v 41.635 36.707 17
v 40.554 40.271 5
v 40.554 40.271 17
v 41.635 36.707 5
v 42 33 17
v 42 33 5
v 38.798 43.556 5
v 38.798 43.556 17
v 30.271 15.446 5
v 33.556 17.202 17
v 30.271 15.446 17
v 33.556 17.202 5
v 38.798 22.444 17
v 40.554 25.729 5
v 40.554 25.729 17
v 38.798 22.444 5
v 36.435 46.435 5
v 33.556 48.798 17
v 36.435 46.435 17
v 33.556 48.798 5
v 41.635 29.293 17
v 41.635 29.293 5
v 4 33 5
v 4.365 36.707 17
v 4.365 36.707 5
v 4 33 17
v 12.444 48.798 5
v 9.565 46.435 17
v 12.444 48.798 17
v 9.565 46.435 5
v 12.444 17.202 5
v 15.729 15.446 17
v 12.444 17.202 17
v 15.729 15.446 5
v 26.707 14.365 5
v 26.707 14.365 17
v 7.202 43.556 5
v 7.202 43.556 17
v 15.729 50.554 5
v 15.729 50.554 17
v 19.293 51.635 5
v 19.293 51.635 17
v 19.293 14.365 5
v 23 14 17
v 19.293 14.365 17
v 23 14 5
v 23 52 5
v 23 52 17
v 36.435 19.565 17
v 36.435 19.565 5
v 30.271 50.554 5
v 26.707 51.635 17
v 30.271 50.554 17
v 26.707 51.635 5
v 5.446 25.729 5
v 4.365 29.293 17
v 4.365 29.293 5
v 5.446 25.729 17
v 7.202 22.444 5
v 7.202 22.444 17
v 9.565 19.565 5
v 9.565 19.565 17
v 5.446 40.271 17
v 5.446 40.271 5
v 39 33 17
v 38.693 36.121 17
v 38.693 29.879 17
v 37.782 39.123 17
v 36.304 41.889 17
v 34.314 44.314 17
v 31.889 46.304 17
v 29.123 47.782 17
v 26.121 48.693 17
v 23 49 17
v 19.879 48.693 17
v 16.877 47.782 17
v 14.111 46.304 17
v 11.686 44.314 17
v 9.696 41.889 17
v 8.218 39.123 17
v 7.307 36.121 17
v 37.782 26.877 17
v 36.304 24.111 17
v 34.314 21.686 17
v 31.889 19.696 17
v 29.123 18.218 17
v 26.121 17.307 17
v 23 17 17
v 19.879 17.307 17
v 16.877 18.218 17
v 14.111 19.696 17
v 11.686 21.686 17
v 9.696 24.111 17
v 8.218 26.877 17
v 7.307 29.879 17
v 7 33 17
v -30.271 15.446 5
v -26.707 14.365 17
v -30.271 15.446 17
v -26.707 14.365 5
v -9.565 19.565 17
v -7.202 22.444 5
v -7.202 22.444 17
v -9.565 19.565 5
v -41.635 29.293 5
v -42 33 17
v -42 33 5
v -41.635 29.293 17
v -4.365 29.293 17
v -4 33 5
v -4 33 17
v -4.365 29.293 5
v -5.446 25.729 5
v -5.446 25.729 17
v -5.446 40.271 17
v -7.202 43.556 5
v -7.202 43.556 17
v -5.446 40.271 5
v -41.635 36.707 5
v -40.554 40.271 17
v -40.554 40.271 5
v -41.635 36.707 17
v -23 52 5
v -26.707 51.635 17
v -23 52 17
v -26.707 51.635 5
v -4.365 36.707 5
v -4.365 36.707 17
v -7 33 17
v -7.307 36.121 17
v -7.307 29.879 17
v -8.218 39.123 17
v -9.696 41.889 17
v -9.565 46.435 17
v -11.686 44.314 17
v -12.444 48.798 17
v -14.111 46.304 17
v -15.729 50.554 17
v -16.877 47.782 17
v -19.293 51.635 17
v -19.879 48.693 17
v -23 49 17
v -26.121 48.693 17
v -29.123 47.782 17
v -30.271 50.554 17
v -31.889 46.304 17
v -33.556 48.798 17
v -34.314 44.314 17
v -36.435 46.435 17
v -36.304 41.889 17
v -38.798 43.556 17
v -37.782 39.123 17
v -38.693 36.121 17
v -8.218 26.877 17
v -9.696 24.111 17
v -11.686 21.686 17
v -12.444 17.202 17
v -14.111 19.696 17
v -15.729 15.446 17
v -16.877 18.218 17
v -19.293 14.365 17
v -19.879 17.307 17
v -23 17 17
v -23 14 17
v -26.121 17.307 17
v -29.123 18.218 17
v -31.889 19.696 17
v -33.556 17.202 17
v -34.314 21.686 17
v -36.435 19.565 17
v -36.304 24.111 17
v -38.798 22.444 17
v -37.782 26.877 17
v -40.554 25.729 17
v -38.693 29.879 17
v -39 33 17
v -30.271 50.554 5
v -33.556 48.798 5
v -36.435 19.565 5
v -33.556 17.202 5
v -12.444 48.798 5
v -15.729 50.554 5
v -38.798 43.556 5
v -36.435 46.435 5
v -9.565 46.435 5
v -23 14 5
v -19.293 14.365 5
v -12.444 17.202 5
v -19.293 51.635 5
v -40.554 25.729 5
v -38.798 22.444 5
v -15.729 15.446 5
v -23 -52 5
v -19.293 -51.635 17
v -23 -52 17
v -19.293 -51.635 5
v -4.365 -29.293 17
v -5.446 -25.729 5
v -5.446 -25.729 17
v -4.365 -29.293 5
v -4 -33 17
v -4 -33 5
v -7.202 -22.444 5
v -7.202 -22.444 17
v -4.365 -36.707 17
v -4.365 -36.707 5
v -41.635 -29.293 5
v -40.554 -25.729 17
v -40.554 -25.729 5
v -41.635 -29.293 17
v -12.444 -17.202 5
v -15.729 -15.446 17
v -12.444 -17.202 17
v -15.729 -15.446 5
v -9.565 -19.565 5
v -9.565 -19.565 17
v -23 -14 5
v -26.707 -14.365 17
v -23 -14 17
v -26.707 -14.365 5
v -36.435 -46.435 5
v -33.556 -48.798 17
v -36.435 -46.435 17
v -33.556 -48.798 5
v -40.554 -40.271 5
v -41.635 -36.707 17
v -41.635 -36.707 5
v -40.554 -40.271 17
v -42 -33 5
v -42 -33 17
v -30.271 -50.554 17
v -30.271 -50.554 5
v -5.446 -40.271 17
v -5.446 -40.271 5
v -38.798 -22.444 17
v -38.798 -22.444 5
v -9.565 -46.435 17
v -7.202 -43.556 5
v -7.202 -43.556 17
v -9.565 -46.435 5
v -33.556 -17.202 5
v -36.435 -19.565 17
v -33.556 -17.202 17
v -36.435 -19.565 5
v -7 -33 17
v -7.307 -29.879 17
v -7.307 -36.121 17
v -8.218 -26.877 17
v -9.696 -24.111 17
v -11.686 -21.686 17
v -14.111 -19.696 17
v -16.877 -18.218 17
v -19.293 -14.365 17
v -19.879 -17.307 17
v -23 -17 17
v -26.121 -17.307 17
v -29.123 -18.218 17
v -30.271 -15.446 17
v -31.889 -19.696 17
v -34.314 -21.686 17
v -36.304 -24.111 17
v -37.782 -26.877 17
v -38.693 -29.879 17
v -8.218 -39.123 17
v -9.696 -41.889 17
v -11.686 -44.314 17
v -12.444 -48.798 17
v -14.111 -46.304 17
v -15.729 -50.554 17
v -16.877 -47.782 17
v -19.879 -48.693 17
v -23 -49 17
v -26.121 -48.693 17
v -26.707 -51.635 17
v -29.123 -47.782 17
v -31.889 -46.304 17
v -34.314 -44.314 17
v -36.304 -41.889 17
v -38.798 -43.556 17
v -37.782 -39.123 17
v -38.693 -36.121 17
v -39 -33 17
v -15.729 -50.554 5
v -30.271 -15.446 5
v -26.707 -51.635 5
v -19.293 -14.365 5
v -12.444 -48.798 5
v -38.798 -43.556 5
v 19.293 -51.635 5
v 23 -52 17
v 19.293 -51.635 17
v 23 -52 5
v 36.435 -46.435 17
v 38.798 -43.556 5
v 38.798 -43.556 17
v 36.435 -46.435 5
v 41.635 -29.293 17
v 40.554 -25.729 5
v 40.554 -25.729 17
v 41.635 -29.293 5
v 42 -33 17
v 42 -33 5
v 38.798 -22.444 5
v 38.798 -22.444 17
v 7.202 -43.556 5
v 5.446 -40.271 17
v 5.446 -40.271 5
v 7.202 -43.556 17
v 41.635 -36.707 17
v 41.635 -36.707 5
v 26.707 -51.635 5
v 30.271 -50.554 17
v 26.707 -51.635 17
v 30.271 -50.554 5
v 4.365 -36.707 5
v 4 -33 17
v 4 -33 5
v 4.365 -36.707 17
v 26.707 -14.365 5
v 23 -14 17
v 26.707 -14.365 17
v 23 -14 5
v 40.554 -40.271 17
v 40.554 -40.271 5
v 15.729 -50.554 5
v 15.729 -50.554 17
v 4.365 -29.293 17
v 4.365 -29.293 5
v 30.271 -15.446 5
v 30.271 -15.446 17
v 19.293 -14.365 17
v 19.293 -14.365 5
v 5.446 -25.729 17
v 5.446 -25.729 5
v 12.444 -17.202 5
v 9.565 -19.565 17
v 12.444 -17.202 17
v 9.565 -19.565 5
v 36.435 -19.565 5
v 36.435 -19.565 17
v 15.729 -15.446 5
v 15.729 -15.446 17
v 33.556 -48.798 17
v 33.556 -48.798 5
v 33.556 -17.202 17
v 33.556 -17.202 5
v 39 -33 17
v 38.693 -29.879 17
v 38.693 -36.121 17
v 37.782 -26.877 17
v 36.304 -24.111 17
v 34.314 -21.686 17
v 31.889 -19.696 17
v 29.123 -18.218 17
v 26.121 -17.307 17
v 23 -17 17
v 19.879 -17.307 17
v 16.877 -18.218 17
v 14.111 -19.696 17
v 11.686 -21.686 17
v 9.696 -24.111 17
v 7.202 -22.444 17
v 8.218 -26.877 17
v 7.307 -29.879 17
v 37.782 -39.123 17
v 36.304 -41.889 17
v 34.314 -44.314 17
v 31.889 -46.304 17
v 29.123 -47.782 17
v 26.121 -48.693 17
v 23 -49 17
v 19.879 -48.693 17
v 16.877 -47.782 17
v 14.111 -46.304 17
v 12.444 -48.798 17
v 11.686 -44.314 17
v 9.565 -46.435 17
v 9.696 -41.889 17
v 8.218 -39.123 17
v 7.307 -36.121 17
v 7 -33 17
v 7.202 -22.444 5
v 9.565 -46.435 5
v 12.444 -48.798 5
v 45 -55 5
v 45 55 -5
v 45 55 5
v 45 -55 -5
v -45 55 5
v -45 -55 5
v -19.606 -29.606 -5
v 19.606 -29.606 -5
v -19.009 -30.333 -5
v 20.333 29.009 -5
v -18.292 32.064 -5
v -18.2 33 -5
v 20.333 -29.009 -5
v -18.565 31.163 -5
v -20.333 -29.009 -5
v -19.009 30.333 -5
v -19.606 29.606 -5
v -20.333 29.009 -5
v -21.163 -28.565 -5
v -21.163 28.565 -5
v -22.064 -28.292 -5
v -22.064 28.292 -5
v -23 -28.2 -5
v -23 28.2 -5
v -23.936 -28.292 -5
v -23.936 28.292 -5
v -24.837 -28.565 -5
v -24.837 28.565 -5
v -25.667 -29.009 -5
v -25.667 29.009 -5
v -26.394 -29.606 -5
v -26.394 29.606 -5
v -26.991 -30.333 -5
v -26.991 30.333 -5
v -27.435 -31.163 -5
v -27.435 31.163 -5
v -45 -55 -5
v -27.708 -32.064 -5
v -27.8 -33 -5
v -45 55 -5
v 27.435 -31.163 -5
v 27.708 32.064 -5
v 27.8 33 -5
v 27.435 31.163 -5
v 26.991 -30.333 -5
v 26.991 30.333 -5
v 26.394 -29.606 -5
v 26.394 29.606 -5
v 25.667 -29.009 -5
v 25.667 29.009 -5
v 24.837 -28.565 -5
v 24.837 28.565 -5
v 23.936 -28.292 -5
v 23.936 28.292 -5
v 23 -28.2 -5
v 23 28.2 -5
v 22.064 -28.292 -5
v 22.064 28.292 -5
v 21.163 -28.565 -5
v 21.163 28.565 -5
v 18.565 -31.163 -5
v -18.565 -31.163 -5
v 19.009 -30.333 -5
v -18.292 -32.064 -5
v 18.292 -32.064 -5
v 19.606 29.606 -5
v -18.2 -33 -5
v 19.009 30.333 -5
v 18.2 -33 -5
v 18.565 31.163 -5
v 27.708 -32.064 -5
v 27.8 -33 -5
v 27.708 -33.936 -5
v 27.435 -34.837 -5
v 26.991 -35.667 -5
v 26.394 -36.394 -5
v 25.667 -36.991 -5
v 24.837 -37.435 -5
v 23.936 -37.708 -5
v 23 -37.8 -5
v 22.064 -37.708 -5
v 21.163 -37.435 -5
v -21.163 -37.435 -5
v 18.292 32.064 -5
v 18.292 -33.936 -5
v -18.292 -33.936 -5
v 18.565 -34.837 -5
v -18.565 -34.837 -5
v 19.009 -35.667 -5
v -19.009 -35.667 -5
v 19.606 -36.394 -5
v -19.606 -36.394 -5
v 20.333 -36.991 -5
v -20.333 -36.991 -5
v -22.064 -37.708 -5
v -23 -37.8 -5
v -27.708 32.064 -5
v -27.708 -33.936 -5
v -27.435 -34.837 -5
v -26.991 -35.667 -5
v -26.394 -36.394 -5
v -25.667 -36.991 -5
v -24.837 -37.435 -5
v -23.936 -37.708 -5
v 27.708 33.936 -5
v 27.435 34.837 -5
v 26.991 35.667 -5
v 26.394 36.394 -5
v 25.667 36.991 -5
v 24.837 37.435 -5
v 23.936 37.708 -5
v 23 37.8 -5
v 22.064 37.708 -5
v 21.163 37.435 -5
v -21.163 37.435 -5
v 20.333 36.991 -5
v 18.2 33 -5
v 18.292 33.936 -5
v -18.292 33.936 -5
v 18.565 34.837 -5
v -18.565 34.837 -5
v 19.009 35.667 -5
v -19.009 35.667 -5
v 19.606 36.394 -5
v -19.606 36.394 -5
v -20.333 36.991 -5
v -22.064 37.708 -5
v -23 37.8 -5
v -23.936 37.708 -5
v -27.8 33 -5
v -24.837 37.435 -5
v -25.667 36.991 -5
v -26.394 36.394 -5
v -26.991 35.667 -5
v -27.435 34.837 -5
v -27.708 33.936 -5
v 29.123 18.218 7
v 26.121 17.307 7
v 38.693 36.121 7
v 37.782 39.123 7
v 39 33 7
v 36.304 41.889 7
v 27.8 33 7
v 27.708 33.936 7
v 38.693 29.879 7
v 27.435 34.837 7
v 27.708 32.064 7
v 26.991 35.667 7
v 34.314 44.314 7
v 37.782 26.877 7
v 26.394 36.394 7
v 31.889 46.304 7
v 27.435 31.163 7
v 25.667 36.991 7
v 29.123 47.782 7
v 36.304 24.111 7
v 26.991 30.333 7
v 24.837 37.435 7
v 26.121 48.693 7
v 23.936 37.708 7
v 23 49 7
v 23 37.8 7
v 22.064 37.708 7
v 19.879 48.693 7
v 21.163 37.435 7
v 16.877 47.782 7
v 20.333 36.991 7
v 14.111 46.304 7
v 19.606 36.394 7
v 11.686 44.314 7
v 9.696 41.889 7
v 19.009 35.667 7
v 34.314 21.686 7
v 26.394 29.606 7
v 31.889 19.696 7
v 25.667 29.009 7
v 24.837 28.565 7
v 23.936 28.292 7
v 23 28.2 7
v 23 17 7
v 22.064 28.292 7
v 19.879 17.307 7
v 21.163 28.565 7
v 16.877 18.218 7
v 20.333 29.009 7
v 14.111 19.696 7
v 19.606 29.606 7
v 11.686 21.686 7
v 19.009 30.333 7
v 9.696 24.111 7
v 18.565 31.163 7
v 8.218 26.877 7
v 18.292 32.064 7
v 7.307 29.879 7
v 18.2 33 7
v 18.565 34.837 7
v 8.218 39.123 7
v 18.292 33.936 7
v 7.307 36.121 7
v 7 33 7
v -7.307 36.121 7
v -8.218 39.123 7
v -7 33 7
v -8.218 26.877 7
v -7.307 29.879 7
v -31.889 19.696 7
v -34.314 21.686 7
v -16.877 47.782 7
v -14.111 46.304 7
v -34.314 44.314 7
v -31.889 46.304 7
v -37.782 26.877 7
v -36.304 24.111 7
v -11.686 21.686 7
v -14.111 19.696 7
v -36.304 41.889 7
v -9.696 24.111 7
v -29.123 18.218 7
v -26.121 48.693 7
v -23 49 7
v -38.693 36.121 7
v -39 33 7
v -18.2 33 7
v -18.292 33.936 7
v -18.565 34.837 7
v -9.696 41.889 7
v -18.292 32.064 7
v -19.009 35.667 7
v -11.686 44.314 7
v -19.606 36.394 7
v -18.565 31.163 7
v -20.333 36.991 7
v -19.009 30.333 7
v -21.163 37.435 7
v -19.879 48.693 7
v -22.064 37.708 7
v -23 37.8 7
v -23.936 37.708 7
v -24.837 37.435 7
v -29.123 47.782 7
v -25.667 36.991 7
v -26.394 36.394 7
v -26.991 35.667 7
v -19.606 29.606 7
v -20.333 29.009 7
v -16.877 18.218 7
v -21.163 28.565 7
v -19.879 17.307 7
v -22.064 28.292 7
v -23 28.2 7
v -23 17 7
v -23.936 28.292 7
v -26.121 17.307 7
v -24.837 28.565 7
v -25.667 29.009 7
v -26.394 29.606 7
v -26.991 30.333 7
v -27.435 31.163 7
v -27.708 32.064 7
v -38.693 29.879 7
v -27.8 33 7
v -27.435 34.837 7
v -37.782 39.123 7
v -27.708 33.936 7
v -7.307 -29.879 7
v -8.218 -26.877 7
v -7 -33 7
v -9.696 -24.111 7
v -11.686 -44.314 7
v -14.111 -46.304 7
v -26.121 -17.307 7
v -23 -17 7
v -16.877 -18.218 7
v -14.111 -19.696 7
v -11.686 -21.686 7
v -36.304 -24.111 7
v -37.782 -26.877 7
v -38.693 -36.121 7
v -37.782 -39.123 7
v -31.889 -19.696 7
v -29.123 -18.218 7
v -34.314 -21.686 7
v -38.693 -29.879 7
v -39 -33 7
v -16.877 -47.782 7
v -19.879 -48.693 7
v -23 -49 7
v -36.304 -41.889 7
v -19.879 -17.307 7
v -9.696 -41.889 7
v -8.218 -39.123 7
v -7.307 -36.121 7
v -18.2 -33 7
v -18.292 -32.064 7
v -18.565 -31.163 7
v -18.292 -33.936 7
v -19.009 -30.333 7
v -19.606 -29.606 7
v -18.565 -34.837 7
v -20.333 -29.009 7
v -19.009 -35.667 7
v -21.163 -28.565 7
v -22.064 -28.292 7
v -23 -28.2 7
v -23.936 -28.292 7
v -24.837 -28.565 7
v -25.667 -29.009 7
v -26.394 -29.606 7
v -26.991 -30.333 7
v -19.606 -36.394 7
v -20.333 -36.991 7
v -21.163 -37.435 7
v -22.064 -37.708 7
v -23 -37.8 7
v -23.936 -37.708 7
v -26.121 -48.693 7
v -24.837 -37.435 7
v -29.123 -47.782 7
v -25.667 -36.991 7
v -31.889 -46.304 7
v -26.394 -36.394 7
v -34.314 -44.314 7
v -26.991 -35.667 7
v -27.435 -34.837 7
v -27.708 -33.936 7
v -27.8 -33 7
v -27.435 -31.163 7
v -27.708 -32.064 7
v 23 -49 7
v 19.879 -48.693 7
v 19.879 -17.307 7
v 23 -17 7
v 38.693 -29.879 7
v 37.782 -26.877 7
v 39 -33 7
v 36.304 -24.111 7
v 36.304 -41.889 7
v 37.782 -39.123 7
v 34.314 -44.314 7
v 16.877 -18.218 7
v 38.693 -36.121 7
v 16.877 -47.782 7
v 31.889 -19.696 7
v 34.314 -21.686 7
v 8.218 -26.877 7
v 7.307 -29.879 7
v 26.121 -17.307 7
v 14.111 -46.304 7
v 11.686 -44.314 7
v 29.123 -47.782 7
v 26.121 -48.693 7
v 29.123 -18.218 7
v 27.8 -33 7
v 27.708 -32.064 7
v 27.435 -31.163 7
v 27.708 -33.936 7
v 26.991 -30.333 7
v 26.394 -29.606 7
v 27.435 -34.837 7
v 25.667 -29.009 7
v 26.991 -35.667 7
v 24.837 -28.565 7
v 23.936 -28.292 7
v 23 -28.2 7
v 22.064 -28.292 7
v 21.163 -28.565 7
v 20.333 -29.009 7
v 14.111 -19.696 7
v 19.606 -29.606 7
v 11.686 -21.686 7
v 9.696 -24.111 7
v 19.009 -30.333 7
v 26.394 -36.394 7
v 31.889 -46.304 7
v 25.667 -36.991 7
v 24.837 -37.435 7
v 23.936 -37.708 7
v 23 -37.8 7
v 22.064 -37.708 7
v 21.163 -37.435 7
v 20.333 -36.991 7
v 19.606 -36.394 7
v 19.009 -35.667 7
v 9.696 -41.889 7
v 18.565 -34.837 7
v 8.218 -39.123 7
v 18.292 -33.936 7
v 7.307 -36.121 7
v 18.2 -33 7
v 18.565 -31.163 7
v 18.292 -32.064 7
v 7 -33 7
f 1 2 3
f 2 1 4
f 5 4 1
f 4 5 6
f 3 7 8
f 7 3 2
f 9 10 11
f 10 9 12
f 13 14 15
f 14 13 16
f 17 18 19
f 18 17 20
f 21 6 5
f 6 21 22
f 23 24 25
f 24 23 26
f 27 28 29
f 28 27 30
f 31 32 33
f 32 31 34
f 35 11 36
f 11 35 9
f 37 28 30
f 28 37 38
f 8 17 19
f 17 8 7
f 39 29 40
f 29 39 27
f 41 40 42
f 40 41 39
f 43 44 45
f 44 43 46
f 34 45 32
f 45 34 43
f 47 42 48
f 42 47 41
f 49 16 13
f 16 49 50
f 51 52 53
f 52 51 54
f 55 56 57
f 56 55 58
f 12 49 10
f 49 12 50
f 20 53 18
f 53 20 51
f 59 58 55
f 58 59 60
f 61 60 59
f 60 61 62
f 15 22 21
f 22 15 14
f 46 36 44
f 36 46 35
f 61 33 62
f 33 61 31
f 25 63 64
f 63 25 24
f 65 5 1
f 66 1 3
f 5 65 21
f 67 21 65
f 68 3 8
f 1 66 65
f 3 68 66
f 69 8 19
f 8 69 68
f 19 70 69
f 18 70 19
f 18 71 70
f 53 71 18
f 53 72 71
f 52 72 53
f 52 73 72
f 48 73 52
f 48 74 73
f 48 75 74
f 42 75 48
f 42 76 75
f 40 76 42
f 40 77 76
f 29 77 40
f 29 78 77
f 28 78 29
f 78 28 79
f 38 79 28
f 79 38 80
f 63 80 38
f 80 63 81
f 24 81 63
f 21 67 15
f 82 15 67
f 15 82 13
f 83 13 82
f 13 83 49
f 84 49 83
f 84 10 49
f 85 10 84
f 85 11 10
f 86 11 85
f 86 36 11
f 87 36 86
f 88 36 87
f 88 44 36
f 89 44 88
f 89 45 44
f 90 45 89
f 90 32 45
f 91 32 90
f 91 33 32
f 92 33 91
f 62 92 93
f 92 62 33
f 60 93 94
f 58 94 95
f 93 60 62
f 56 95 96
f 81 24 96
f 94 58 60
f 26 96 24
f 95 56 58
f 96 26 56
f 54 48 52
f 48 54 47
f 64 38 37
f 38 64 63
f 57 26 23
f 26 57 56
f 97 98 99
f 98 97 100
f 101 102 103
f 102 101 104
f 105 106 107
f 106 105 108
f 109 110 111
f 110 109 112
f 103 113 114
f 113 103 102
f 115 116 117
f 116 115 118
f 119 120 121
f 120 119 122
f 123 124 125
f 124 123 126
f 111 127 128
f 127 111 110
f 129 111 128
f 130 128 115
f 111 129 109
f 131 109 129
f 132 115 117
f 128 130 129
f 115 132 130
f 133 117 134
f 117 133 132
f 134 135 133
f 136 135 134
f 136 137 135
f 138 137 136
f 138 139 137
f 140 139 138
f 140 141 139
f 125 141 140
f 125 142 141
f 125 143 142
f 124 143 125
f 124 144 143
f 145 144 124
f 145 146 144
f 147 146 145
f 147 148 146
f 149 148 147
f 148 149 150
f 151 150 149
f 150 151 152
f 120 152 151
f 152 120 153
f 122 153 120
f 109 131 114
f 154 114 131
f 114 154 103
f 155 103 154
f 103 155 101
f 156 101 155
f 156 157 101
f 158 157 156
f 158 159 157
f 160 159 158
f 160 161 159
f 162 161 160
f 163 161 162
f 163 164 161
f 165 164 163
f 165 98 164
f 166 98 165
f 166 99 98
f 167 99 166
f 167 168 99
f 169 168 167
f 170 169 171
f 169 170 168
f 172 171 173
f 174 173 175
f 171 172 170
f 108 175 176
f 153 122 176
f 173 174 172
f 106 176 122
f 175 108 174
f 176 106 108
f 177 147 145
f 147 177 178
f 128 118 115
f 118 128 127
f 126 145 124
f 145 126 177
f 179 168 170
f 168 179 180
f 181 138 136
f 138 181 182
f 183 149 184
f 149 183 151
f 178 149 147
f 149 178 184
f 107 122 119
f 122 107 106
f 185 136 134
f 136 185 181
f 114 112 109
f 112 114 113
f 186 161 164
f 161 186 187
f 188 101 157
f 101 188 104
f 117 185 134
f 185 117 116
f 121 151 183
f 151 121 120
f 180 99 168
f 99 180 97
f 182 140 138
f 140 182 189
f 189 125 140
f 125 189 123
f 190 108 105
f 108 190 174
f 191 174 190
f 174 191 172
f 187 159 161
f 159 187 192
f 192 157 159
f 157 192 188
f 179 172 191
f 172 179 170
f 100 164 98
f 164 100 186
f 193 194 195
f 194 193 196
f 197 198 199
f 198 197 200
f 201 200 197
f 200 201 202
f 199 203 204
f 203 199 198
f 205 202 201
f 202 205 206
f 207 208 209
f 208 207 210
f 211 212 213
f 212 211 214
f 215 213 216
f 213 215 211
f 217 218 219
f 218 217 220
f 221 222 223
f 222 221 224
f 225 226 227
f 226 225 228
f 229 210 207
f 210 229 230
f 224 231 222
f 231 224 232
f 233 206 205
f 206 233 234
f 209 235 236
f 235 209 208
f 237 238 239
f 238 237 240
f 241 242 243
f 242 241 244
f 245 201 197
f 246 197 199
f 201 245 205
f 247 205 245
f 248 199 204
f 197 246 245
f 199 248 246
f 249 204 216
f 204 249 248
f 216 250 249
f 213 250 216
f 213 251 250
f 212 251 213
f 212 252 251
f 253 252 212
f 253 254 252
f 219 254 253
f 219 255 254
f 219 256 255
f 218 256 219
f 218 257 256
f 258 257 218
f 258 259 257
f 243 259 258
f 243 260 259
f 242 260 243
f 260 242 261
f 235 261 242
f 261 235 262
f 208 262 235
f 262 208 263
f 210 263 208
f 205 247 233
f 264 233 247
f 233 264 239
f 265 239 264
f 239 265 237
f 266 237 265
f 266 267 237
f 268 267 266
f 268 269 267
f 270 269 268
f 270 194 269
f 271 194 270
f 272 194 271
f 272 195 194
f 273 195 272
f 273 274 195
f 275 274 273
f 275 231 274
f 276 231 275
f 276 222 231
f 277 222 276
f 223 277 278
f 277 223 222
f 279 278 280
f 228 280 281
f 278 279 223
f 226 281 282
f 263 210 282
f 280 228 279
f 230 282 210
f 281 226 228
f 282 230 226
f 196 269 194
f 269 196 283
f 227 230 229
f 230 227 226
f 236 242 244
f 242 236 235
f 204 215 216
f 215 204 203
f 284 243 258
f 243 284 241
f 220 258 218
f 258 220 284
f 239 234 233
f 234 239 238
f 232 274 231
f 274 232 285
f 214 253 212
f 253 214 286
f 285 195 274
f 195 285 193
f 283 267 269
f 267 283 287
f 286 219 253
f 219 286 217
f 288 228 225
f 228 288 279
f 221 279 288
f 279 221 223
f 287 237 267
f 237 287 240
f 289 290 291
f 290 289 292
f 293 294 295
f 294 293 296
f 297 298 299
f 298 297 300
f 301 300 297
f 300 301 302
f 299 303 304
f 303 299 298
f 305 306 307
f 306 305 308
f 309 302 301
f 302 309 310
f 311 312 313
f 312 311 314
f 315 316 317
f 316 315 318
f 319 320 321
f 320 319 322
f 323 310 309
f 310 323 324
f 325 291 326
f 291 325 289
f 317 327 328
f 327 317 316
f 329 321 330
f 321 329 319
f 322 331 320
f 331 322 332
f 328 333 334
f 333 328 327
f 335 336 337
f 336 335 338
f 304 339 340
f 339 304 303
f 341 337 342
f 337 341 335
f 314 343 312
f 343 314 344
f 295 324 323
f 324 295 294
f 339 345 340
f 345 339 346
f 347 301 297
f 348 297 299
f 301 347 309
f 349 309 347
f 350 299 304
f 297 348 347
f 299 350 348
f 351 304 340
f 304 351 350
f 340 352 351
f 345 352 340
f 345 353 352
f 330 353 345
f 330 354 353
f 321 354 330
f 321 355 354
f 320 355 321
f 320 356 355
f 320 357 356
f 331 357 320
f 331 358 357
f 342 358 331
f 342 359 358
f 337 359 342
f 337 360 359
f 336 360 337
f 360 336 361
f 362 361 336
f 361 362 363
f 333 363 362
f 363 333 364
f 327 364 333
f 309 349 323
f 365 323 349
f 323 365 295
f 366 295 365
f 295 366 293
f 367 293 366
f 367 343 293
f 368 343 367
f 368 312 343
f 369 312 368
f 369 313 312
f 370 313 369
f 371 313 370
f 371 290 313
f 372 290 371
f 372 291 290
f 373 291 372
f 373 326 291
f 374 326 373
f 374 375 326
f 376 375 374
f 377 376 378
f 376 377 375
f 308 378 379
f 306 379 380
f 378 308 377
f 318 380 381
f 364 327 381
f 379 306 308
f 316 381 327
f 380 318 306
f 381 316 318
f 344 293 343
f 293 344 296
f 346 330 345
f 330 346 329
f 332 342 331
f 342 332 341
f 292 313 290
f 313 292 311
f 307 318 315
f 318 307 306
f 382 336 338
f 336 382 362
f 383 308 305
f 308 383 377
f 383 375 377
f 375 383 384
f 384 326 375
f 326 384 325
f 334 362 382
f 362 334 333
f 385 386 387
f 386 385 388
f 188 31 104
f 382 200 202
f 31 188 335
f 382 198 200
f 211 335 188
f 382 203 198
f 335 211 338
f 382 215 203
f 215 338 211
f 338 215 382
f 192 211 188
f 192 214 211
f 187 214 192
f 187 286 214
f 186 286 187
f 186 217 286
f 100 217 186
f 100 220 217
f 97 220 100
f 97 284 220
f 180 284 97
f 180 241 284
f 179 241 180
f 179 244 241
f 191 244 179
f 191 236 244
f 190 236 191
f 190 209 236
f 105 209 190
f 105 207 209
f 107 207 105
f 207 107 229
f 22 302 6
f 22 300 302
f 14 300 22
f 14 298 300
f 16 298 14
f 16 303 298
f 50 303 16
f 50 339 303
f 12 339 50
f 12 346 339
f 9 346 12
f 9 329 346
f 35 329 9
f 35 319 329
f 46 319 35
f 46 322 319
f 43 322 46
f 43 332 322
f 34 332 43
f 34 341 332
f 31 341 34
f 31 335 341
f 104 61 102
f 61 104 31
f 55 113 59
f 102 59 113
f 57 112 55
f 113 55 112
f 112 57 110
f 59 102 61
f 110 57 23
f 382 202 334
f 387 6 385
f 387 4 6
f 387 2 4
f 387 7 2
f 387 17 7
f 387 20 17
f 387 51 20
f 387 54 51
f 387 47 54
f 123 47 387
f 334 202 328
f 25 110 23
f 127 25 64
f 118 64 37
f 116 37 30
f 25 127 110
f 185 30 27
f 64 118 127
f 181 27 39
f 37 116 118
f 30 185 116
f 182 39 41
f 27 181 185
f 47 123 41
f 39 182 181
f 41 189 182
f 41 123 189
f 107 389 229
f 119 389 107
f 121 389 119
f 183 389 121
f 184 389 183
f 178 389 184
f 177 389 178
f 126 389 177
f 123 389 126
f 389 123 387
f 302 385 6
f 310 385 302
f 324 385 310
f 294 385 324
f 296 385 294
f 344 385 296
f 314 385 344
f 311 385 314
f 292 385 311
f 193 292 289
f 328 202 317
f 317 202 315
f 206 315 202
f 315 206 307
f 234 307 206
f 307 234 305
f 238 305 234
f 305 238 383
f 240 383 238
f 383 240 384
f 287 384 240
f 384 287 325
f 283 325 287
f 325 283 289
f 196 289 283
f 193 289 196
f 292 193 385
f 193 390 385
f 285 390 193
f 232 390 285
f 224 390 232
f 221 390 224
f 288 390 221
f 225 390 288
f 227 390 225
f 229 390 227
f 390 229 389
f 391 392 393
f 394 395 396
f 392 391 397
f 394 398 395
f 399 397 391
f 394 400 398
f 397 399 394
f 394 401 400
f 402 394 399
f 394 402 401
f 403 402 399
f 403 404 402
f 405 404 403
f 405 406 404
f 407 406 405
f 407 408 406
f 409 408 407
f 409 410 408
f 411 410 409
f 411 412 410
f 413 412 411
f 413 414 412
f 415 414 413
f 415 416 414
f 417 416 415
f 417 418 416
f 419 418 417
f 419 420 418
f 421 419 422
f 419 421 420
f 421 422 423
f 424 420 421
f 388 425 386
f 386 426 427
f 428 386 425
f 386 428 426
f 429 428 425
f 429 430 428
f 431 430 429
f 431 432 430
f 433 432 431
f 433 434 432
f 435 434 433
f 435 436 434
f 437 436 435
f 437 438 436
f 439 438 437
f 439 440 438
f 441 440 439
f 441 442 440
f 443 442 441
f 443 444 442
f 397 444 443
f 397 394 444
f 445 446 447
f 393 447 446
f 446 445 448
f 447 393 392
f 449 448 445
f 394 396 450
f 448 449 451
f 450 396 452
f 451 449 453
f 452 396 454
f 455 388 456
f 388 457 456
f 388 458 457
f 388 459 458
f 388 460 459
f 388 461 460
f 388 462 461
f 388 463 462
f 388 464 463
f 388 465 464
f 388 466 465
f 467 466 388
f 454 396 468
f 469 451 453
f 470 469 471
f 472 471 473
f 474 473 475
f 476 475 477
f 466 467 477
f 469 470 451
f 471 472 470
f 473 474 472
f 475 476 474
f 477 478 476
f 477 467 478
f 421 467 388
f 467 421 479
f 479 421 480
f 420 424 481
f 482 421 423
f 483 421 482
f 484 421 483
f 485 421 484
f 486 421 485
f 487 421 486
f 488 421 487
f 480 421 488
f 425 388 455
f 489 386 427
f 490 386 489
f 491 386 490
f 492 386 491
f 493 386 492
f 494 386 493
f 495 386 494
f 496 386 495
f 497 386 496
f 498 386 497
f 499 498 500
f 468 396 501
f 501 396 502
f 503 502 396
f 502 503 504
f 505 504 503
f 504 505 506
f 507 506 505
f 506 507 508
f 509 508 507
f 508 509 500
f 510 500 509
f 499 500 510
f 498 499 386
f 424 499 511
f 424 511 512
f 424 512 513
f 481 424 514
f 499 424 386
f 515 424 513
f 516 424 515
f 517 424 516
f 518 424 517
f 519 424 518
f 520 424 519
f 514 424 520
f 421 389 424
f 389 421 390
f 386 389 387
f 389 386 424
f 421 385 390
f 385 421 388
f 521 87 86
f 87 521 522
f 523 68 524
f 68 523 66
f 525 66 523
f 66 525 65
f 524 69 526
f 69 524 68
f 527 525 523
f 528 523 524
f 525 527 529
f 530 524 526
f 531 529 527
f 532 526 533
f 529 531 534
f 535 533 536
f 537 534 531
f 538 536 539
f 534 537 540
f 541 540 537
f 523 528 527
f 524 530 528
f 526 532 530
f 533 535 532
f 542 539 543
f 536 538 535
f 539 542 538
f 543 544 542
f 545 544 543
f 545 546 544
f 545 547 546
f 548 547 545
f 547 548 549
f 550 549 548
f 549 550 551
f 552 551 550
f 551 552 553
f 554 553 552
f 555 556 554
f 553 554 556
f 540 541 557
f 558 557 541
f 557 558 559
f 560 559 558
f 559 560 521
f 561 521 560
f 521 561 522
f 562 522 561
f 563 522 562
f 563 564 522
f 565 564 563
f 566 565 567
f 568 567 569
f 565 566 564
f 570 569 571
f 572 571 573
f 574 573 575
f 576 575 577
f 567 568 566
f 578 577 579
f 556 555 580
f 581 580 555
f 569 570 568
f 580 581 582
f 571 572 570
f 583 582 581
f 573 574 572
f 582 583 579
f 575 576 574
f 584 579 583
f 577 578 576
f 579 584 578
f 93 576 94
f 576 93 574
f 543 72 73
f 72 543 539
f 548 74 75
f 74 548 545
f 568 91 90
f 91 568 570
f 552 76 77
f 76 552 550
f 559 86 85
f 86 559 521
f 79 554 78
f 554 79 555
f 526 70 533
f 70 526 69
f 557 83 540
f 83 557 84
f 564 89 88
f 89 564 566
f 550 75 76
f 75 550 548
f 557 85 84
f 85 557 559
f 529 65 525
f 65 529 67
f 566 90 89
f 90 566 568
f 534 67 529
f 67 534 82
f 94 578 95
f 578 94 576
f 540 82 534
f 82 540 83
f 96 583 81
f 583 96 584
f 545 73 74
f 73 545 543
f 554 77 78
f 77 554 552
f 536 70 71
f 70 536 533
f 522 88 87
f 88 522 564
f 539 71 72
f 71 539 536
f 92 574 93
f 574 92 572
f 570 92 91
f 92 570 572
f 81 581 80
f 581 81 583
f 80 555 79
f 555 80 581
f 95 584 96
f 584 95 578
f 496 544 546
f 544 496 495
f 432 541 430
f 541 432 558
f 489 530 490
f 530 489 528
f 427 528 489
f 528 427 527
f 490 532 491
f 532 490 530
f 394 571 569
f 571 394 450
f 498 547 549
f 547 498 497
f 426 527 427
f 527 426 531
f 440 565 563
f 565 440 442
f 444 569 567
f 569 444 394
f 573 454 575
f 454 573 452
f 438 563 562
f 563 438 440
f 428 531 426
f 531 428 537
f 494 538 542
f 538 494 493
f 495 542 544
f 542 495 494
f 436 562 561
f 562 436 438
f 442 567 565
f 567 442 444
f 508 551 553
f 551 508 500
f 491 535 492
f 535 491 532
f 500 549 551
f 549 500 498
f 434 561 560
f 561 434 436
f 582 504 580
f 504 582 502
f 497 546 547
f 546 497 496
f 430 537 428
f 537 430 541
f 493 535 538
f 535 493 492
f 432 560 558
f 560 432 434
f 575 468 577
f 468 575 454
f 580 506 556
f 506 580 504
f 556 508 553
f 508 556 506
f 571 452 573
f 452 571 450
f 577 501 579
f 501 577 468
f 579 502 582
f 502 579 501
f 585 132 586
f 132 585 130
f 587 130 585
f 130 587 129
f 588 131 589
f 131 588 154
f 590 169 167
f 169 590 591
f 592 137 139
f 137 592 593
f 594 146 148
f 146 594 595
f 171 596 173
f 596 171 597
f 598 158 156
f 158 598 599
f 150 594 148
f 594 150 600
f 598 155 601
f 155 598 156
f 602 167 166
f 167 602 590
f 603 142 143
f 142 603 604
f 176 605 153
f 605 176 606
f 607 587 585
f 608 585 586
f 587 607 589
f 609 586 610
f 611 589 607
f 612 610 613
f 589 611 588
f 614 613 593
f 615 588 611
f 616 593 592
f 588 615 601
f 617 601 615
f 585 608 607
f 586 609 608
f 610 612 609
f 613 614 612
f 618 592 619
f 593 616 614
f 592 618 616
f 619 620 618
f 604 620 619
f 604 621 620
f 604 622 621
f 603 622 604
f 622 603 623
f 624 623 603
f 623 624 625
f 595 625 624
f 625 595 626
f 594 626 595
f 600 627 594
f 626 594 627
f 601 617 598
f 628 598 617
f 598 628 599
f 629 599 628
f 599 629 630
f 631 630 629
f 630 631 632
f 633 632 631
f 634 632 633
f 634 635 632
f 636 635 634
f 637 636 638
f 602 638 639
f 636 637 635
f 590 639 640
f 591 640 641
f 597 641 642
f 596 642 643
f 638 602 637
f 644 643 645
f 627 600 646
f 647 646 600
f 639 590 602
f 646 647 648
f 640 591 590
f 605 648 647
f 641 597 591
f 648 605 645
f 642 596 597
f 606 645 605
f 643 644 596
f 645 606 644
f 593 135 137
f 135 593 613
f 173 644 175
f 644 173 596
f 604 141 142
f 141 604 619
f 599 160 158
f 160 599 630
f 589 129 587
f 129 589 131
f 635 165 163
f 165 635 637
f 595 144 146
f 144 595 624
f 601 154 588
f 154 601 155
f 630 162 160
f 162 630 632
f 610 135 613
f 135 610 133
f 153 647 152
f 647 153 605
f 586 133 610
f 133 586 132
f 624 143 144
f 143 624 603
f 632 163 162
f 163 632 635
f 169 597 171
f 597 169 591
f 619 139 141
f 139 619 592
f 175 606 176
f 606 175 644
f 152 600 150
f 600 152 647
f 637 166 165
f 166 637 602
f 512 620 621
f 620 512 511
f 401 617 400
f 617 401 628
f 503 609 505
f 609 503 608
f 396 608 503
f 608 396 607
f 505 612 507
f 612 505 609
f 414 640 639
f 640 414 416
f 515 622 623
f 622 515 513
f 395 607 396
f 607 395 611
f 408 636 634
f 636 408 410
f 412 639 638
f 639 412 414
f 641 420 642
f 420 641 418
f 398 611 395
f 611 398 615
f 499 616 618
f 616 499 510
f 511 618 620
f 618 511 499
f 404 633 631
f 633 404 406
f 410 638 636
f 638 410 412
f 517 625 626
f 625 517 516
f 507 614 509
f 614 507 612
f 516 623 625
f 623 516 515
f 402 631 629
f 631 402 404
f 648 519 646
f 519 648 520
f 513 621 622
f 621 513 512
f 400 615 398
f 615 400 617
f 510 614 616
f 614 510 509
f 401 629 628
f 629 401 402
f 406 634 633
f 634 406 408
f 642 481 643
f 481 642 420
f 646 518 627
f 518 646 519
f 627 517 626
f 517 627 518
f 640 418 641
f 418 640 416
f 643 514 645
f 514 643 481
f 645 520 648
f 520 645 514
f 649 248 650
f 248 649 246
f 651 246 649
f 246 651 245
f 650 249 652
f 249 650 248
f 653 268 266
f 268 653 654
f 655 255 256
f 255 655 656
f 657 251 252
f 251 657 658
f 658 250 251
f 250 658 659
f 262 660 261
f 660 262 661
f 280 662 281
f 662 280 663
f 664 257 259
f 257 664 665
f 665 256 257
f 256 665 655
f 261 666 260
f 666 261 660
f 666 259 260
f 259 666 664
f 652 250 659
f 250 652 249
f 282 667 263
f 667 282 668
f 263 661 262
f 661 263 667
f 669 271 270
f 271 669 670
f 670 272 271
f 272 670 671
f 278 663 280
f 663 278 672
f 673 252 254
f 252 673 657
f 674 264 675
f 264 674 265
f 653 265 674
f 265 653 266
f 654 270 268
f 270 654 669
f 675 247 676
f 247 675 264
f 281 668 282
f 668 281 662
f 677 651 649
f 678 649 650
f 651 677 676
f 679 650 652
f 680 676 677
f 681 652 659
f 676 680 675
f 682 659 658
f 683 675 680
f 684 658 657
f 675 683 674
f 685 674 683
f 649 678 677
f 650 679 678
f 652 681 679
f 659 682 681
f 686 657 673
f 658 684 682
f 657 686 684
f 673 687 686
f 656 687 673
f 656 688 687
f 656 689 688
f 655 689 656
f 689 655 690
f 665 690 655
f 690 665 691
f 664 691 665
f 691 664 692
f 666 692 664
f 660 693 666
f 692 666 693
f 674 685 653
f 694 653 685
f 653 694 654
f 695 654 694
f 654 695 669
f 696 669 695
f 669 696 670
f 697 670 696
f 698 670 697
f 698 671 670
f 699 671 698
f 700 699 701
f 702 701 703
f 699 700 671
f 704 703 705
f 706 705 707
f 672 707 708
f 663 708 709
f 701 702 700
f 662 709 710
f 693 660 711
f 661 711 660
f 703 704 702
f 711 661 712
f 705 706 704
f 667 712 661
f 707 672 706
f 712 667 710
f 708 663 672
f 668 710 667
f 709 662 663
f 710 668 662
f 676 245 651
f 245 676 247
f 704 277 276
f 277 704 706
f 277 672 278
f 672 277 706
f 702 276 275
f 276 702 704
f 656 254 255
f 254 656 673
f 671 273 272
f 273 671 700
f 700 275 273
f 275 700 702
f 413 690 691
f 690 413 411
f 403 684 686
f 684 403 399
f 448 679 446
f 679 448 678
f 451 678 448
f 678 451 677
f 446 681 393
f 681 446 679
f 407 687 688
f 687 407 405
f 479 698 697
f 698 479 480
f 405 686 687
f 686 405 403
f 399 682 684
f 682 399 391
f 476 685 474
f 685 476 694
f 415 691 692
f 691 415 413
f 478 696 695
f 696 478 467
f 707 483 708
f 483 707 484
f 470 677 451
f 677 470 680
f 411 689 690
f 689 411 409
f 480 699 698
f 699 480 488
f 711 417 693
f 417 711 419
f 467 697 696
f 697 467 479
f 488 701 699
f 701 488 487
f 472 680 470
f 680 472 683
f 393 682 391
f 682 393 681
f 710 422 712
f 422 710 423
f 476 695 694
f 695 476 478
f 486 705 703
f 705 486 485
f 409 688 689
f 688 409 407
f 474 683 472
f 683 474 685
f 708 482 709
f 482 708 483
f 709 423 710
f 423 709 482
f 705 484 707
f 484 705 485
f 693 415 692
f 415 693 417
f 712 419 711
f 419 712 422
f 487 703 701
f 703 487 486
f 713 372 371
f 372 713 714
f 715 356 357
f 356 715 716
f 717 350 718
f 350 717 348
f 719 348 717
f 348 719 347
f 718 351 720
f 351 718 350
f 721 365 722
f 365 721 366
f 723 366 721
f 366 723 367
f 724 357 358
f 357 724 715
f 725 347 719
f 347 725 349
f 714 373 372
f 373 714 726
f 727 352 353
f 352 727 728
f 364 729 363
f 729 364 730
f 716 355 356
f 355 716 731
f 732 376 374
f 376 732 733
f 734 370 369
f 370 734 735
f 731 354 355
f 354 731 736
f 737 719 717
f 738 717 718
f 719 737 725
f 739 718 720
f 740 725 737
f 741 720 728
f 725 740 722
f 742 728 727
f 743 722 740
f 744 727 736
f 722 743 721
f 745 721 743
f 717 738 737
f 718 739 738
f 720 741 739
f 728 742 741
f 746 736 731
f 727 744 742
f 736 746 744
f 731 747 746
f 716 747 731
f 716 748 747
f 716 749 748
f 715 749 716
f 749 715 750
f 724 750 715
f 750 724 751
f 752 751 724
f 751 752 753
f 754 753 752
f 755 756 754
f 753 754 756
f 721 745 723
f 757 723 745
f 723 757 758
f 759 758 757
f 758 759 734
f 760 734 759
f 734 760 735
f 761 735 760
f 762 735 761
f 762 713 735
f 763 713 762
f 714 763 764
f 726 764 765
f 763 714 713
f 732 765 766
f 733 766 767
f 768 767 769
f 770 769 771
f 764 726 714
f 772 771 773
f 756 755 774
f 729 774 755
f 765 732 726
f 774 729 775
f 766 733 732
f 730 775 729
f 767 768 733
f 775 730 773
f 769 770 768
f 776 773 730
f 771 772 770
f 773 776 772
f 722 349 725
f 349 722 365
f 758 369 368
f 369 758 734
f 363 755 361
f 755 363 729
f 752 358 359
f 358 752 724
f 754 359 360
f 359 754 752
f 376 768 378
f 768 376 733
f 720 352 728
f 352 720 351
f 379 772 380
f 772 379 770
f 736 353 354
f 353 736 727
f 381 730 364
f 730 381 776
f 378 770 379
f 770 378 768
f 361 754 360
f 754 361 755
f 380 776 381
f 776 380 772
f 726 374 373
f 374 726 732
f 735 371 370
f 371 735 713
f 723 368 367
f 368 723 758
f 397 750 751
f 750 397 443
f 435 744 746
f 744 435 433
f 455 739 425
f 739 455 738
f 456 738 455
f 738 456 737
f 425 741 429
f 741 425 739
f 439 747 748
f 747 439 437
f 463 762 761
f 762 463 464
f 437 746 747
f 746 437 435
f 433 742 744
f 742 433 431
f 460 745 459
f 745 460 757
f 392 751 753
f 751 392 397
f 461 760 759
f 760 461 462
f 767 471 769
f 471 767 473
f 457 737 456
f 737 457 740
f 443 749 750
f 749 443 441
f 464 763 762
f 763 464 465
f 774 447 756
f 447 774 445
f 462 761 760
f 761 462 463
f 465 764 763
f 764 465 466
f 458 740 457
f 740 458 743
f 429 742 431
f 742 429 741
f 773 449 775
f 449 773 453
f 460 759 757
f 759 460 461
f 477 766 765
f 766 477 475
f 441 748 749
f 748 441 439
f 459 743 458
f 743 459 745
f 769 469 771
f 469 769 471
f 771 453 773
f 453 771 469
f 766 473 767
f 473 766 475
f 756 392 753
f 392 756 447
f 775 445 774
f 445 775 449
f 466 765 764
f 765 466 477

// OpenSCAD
$fn = 32;

// ----------------------------------------------------------------------
// Socket pad plate
// bosses with counterbored sockets for the screws
// ----------------------------------------------------------------------

// --- parameters (mm) ---
base_t = 10;            // base plate thickness
boss_h = 12;            // boss height above the base plate
boss_d = 38;            // boss diameter
socket_d = 32;          // socket diameter
socket_depth = 10;      // socket depth from the boss face
bolt_d = 9.6;           // screw clearance hole through the socket floor
plate = [90, 110, 10];  // overall size (x, y, z)
edge = 22;              // boss centre offset from the plate edge
pads = 4;               // boss count, one per corner

// --- derived feature positions (mm) ---
height = base_t + boss_h;        // = 22   overall height of the part
corner_x = plate[0] / 2 - edge;  // = 23   boss centre X
corner_y = plate[1] / 2 - edge;  // = 33   boss centre Y
feature_centers = [
  [corner_x, corner_y],
  [-corner_x, corner_y],
  [-corner_x, -corner_y],
  [corner_x, -corner_y]
];   // boss centres: sockets, holes and the pads themselves are placed from here

// base plate, bosses on feature_centers, socket + through hole in each
difference() {
  union() {
    cube(plate, center = true);
    for (centre = feature_centers)
      translate([centre[0], centre[1], plate[2] / 2 - 1])
        cylinder(d = boss_d, h = boss_h + 1);
  }
  for (centre = feature_centers) {
    translate([centre[0], centre[1], plate[2] / 2 + boss_h - socket_depth])
      cylinder(d = socket_d, h = socket_depth + 1);
    translate([centre[0], centre[1], -height])
      cylinder(d = bolt_d, h = 2 * height + 2);  // through the socket floor
  }
}
